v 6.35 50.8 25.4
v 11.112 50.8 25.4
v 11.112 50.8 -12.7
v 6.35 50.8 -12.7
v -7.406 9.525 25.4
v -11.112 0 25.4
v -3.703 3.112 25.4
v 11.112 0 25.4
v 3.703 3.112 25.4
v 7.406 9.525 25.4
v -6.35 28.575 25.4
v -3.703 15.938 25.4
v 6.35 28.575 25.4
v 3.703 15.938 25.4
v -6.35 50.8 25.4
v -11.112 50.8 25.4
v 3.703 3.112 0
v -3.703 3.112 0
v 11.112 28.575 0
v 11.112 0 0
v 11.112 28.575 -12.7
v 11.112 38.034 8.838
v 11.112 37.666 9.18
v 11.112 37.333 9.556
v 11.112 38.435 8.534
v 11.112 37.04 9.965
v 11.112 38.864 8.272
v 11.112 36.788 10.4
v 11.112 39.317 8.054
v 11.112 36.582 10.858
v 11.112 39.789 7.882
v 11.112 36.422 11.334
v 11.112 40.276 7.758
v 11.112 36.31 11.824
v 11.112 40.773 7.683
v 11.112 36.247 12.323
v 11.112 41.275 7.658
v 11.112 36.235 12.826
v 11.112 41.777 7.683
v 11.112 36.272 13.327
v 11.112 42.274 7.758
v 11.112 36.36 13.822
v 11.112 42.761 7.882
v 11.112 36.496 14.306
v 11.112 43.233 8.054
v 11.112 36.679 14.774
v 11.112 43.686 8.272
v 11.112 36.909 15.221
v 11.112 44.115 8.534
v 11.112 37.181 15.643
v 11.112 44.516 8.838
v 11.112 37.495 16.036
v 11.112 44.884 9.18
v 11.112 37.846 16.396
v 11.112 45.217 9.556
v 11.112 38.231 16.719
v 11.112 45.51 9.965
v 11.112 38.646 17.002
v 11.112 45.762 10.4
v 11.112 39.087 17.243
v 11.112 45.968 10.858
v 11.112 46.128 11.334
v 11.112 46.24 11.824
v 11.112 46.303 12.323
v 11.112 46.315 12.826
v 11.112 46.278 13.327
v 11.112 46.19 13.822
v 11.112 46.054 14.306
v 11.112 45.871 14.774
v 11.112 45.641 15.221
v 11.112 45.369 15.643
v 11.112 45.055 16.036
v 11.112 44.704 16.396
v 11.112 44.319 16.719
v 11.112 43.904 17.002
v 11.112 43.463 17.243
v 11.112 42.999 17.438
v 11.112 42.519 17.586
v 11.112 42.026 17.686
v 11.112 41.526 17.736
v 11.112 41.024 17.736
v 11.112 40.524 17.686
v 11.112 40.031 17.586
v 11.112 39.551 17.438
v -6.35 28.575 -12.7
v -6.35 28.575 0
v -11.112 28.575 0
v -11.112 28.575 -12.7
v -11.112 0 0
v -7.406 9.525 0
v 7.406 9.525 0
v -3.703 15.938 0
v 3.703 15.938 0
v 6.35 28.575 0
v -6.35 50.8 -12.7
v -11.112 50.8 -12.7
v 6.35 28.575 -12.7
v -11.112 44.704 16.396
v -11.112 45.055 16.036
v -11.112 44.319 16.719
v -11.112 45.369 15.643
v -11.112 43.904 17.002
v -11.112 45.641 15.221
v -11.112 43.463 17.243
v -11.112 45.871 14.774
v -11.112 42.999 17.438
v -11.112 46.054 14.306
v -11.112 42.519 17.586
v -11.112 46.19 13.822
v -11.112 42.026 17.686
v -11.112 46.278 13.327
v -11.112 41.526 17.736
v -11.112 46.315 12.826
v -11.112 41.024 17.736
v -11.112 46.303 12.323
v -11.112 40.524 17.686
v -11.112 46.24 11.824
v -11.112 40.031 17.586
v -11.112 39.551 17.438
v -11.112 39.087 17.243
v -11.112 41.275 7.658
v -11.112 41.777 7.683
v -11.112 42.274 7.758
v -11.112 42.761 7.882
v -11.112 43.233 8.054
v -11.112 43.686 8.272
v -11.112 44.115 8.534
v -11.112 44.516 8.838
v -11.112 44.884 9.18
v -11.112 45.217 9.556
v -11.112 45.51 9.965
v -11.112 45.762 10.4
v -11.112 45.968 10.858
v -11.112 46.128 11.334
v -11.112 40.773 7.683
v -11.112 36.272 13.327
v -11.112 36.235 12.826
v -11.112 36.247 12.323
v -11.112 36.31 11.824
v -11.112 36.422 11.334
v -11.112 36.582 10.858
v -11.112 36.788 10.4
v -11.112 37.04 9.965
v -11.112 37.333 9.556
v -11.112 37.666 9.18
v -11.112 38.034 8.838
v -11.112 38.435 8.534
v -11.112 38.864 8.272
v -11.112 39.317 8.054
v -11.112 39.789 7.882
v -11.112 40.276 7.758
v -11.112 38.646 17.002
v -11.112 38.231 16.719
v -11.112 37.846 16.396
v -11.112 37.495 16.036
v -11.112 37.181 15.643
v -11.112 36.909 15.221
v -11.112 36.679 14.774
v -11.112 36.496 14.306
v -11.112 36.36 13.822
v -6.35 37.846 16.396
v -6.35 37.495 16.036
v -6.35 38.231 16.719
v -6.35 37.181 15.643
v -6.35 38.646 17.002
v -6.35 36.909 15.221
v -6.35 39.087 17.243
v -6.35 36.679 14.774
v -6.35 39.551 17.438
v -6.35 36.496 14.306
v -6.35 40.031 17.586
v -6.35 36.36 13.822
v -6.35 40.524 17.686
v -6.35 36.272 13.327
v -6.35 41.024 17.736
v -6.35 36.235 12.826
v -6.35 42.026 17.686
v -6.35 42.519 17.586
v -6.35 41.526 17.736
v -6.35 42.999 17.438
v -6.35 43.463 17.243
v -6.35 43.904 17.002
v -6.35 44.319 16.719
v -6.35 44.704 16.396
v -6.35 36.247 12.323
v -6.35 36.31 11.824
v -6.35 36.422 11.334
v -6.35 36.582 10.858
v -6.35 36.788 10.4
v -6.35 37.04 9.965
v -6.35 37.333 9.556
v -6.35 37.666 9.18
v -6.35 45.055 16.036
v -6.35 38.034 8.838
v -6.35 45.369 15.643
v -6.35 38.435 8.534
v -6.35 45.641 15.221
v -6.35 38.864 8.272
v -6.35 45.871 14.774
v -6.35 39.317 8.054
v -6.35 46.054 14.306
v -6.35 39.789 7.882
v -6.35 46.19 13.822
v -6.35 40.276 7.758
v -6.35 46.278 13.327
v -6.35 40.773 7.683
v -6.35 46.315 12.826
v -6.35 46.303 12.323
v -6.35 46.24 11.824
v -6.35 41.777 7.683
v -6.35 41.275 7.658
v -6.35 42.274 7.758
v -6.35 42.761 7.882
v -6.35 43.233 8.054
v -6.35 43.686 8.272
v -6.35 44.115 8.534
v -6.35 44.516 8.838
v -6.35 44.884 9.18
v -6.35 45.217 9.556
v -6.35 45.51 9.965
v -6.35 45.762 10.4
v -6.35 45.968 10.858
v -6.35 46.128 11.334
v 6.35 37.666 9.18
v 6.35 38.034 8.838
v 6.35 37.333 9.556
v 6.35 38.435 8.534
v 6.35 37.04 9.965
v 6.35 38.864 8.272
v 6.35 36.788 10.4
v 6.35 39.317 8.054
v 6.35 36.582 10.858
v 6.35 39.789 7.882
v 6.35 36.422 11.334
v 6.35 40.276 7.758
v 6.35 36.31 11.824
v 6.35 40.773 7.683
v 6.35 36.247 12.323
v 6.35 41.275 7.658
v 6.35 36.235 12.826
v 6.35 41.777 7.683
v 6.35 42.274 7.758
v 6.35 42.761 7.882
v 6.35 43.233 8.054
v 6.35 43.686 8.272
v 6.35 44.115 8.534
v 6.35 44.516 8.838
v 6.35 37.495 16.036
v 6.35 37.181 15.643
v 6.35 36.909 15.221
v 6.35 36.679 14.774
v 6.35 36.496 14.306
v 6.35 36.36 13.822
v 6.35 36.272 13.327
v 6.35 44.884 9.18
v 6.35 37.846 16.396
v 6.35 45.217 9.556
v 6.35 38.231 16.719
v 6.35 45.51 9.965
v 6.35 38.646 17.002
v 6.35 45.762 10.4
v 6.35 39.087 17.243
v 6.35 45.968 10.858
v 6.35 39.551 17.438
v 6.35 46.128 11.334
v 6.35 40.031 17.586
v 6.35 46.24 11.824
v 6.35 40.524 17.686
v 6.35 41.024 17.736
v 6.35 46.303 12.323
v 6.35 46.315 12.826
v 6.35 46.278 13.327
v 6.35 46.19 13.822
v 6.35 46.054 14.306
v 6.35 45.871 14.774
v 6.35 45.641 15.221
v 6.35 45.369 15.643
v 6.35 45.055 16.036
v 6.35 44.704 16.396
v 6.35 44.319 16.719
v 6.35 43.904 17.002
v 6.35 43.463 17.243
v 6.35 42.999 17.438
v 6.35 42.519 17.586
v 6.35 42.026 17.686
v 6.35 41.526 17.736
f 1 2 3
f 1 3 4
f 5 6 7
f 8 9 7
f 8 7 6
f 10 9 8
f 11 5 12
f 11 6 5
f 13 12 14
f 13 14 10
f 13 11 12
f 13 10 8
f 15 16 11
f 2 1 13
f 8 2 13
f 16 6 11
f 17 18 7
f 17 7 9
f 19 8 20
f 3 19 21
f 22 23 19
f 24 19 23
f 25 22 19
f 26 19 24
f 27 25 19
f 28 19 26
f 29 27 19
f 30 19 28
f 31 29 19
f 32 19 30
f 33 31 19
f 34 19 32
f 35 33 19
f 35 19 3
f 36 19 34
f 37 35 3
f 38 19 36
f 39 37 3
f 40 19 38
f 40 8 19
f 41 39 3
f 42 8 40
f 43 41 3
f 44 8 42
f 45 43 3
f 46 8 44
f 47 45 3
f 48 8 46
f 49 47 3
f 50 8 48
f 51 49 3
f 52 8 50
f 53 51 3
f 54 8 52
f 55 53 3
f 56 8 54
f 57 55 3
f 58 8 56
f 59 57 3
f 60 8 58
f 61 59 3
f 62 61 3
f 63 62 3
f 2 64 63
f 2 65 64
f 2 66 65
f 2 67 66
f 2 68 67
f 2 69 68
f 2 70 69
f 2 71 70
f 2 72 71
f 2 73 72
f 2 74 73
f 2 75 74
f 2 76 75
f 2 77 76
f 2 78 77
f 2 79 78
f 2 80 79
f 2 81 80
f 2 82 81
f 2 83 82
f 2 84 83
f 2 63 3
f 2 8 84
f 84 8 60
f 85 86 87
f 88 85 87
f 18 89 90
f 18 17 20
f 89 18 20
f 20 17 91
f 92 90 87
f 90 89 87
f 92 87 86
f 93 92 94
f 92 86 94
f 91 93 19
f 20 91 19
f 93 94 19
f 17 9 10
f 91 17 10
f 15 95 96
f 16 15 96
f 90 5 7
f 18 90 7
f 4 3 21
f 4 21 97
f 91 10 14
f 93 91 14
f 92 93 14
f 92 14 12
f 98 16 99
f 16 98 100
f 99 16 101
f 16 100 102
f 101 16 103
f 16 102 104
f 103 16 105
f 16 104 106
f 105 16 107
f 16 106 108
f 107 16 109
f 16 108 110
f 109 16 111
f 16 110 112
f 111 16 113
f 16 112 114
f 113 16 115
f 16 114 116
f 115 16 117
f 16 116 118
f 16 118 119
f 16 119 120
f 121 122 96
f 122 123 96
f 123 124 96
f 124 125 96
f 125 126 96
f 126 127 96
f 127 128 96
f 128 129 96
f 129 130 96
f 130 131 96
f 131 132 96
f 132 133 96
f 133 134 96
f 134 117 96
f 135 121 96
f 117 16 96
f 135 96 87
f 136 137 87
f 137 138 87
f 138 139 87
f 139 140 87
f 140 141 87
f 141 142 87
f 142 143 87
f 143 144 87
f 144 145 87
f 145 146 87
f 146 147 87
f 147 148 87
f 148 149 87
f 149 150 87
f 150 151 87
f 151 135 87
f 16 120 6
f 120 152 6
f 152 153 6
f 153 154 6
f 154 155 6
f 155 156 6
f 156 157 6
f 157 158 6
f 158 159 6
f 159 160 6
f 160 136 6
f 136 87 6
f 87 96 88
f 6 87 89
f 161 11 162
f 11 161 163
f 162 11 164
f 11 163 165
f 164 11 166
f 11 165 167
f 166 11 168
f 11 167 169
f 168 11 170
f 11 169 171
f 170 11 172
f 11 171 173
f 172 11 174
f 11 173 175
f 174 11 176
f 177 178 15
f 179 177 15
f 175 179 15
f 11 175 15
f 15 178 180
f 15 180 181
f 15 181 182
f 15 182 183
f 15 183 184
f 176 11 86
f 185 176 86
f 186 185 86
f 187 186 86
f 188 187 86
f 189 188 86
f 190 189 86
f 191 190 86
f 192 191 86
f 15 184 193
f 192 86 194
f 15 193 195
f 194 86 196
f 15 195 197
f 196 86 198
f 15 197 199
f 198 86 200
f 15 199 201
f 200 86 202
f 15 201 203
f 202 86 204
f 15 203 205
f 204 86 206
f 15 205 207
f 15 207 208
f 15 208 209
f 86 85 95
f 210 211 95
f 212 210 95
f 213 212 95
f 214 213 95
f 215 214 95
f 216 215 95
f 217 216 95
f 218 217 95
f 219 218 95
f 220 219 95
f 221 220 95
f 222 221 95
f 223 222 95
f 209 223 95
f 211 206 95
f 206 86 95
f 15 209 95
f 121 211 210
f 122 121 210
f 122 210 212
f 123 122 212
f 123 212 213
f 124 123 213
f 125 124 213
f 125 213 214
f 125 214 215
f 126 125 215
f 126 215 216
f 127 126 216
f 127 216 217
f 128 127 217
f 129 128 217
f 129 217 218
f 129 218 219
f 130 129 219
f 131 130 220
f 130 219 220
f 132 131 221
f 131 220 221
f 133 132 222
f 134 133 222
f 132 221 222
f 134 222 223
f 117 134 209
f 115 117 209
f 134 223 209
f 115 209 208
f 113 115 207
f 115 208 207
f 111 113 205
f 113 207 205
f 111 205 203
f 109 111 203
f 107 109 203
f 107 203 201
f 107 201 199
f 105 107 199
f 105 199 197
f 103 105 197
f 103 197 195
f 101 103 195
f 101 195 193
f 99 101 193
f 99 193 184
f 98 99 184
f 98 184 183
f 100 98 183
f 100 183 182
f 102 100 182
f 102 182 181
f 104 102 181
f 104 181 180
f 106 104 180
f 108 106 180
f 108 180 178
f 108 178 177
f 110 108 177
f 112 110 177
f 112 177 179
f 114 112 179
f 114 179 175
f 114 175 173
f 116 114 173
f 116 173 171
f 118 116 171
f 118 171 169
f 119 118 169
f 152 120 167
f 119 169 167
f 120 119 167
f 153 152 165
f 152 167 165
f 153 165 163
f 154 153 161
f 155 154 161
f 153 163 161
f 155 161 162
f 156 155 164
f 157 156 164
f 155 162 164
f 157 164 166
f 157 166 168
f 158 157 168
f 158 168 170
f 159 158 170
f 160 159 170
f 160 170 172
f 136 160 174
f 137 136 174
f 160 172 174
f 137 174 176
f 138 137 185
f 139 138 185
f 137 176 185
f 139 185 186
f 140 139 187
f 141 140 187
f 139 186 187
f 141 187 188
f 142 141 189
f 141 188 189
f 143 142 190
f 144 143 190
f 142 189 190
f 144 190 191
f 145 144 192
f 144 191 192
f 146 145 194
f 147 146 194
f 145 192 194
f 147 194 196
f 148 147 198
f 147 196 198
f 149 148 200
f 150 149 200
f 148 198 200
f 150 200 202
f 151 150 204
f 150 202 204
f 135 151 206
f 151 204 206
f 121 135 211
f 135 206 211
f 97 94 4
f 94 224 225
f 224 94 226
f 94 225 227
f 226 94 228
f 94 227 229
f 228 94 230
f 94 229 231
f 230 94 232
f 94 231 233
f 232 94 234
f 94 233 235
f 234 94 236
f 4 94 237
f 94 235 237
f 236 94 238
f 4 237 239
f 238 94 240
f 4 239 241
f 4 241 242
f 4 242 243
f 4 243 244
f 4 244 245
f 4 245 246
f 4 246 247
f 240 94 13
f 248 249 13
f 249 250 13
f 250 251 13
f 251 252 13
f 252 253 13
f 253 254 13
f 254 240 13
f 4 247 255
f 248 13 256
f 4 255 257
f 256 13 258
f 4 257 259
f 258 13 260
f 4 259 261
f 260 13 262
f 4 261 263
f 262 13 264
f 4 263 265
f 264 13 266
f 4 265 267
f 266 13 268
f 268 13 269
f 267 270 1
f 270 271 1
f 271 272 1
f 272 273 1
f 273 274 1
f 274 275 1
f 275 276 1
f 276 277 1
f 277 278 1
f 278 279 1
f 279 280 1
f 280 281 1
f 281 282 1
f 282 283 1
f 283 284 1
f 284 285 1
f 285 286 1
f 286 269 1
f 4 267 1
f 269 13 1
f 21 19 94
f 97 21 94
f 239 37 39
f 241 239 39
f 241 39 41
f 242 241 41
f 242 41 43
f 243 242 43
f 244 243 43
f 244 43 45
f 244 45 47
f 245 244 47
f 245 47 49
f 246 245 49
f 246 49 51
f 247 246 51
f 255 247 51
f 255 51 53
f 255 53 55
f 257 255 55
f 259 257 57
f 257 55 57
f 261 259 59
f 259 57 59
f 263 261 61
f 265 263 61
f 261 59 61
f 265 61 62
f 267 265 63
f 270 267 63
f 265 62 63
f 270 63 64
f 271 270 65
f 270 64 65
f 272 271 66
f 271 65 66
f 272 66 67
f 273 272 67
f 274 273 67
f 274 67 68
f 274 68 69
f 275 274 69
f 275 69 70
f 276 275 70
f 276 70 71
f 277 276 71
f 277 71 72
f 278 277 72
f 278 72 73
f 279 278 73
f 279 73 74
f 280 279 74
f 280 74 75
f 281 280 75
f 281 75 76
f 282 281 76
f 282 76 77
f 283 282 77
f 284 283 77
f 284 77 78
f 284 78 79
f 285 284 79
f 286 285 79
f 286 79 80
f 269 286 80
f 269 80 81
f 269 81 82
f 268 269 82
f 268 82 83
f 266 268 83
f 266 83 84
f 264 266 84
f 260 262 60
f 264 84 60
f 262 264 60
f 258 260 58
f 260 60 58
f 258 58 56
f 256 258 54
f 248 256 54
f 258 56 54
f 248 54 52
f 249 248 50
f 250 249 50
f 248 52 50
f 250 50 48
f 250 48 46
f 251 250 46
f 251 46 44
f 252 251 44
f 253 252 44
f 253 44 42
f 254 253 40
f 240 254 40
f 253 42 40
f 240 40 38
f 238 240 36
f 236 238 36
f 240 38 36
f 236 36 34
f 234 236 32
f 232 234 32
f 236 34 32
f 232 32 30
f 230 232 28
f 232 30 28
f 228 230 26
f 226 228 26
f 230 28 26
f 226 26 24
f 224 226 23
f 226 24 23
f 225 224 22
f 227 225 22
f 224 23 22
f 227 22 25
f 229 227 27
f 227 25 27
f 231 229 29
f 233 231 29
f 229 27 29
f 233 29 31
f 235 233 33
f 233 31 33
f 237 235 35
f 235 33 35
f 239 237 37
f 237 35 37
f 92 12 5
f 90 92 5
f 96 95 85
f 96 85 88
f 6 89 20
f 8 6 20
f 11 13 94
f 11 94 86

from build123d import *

# Parameters (mm, degrees)
BOSS_EXTRUDE1_DEPTH     = 25.4
CUT_EXTRUDE1_DEPTH      = 26.4
F_3_8_CLEARANCE_HOLE1_D = 10.0838
SKETCH7_W               = 4.7625
SKETCH7_H               = 22.225
BOSS_EXTRUDE2_DEPTH     = 12.7


with BuildPart() as part:
    # Sketch1 → Boss-Extrude1 (new body)
    with BuildSketch(Plane.XY):
        Polygon((-11.1125, 0), (11.1125, 0), (11.1125, 50.8), (6.35, 50.8), (6.35, 28.575), (-6.35, 28.575), (-6.35, 50.8), (-11.1125, 50.8), align=None)
    extrude(amount=BOSS_EXTRUDE1_DEPTH)

    # Sketch2 → Cut-Extrude1 (cut, through all)
    with BuildSketch(Plane.XY.offset(25.4)):
        Polygon((3.702835951, 15.9385), (-3.702835951, 15.9385), (-7.405671903, 9.525), (-3.702835951, 3.1115), (3.702835951, 3.1115), (7.405671903, 9.525), align=None)
    extrude(amount=-CUT_EXTRUDE1_DEPTH, mode=Mode.SUBTRACT)

    # 3/8 Clearance Hole1 (through all)
    with Locations(Plane.ZY.offset(11.1125)):
        with Locations((12.7, 41.275)):
            Hole(F_3_8_CLEARANCE_HOLE1_D / 2)

    # Sketch7 → Boss-Extrude2 (add)
    with BuildSketch(Plane(origin=(0, 0, 0), x_dir=(-1, 0, 0), z_dir=(0, 0, -1))):
        with Locations((-8.73125, 39.6875)):
            Rectangle(SKETCH7_W, SKETCH7_H)
        with Locations((8.73125, 39.6875)):
            Rectangle(SKETCH7_W, SKETCH7_H)
    extrude(amount=BOSS_EXTRUDE2_DEPTH)


solid = part.part
